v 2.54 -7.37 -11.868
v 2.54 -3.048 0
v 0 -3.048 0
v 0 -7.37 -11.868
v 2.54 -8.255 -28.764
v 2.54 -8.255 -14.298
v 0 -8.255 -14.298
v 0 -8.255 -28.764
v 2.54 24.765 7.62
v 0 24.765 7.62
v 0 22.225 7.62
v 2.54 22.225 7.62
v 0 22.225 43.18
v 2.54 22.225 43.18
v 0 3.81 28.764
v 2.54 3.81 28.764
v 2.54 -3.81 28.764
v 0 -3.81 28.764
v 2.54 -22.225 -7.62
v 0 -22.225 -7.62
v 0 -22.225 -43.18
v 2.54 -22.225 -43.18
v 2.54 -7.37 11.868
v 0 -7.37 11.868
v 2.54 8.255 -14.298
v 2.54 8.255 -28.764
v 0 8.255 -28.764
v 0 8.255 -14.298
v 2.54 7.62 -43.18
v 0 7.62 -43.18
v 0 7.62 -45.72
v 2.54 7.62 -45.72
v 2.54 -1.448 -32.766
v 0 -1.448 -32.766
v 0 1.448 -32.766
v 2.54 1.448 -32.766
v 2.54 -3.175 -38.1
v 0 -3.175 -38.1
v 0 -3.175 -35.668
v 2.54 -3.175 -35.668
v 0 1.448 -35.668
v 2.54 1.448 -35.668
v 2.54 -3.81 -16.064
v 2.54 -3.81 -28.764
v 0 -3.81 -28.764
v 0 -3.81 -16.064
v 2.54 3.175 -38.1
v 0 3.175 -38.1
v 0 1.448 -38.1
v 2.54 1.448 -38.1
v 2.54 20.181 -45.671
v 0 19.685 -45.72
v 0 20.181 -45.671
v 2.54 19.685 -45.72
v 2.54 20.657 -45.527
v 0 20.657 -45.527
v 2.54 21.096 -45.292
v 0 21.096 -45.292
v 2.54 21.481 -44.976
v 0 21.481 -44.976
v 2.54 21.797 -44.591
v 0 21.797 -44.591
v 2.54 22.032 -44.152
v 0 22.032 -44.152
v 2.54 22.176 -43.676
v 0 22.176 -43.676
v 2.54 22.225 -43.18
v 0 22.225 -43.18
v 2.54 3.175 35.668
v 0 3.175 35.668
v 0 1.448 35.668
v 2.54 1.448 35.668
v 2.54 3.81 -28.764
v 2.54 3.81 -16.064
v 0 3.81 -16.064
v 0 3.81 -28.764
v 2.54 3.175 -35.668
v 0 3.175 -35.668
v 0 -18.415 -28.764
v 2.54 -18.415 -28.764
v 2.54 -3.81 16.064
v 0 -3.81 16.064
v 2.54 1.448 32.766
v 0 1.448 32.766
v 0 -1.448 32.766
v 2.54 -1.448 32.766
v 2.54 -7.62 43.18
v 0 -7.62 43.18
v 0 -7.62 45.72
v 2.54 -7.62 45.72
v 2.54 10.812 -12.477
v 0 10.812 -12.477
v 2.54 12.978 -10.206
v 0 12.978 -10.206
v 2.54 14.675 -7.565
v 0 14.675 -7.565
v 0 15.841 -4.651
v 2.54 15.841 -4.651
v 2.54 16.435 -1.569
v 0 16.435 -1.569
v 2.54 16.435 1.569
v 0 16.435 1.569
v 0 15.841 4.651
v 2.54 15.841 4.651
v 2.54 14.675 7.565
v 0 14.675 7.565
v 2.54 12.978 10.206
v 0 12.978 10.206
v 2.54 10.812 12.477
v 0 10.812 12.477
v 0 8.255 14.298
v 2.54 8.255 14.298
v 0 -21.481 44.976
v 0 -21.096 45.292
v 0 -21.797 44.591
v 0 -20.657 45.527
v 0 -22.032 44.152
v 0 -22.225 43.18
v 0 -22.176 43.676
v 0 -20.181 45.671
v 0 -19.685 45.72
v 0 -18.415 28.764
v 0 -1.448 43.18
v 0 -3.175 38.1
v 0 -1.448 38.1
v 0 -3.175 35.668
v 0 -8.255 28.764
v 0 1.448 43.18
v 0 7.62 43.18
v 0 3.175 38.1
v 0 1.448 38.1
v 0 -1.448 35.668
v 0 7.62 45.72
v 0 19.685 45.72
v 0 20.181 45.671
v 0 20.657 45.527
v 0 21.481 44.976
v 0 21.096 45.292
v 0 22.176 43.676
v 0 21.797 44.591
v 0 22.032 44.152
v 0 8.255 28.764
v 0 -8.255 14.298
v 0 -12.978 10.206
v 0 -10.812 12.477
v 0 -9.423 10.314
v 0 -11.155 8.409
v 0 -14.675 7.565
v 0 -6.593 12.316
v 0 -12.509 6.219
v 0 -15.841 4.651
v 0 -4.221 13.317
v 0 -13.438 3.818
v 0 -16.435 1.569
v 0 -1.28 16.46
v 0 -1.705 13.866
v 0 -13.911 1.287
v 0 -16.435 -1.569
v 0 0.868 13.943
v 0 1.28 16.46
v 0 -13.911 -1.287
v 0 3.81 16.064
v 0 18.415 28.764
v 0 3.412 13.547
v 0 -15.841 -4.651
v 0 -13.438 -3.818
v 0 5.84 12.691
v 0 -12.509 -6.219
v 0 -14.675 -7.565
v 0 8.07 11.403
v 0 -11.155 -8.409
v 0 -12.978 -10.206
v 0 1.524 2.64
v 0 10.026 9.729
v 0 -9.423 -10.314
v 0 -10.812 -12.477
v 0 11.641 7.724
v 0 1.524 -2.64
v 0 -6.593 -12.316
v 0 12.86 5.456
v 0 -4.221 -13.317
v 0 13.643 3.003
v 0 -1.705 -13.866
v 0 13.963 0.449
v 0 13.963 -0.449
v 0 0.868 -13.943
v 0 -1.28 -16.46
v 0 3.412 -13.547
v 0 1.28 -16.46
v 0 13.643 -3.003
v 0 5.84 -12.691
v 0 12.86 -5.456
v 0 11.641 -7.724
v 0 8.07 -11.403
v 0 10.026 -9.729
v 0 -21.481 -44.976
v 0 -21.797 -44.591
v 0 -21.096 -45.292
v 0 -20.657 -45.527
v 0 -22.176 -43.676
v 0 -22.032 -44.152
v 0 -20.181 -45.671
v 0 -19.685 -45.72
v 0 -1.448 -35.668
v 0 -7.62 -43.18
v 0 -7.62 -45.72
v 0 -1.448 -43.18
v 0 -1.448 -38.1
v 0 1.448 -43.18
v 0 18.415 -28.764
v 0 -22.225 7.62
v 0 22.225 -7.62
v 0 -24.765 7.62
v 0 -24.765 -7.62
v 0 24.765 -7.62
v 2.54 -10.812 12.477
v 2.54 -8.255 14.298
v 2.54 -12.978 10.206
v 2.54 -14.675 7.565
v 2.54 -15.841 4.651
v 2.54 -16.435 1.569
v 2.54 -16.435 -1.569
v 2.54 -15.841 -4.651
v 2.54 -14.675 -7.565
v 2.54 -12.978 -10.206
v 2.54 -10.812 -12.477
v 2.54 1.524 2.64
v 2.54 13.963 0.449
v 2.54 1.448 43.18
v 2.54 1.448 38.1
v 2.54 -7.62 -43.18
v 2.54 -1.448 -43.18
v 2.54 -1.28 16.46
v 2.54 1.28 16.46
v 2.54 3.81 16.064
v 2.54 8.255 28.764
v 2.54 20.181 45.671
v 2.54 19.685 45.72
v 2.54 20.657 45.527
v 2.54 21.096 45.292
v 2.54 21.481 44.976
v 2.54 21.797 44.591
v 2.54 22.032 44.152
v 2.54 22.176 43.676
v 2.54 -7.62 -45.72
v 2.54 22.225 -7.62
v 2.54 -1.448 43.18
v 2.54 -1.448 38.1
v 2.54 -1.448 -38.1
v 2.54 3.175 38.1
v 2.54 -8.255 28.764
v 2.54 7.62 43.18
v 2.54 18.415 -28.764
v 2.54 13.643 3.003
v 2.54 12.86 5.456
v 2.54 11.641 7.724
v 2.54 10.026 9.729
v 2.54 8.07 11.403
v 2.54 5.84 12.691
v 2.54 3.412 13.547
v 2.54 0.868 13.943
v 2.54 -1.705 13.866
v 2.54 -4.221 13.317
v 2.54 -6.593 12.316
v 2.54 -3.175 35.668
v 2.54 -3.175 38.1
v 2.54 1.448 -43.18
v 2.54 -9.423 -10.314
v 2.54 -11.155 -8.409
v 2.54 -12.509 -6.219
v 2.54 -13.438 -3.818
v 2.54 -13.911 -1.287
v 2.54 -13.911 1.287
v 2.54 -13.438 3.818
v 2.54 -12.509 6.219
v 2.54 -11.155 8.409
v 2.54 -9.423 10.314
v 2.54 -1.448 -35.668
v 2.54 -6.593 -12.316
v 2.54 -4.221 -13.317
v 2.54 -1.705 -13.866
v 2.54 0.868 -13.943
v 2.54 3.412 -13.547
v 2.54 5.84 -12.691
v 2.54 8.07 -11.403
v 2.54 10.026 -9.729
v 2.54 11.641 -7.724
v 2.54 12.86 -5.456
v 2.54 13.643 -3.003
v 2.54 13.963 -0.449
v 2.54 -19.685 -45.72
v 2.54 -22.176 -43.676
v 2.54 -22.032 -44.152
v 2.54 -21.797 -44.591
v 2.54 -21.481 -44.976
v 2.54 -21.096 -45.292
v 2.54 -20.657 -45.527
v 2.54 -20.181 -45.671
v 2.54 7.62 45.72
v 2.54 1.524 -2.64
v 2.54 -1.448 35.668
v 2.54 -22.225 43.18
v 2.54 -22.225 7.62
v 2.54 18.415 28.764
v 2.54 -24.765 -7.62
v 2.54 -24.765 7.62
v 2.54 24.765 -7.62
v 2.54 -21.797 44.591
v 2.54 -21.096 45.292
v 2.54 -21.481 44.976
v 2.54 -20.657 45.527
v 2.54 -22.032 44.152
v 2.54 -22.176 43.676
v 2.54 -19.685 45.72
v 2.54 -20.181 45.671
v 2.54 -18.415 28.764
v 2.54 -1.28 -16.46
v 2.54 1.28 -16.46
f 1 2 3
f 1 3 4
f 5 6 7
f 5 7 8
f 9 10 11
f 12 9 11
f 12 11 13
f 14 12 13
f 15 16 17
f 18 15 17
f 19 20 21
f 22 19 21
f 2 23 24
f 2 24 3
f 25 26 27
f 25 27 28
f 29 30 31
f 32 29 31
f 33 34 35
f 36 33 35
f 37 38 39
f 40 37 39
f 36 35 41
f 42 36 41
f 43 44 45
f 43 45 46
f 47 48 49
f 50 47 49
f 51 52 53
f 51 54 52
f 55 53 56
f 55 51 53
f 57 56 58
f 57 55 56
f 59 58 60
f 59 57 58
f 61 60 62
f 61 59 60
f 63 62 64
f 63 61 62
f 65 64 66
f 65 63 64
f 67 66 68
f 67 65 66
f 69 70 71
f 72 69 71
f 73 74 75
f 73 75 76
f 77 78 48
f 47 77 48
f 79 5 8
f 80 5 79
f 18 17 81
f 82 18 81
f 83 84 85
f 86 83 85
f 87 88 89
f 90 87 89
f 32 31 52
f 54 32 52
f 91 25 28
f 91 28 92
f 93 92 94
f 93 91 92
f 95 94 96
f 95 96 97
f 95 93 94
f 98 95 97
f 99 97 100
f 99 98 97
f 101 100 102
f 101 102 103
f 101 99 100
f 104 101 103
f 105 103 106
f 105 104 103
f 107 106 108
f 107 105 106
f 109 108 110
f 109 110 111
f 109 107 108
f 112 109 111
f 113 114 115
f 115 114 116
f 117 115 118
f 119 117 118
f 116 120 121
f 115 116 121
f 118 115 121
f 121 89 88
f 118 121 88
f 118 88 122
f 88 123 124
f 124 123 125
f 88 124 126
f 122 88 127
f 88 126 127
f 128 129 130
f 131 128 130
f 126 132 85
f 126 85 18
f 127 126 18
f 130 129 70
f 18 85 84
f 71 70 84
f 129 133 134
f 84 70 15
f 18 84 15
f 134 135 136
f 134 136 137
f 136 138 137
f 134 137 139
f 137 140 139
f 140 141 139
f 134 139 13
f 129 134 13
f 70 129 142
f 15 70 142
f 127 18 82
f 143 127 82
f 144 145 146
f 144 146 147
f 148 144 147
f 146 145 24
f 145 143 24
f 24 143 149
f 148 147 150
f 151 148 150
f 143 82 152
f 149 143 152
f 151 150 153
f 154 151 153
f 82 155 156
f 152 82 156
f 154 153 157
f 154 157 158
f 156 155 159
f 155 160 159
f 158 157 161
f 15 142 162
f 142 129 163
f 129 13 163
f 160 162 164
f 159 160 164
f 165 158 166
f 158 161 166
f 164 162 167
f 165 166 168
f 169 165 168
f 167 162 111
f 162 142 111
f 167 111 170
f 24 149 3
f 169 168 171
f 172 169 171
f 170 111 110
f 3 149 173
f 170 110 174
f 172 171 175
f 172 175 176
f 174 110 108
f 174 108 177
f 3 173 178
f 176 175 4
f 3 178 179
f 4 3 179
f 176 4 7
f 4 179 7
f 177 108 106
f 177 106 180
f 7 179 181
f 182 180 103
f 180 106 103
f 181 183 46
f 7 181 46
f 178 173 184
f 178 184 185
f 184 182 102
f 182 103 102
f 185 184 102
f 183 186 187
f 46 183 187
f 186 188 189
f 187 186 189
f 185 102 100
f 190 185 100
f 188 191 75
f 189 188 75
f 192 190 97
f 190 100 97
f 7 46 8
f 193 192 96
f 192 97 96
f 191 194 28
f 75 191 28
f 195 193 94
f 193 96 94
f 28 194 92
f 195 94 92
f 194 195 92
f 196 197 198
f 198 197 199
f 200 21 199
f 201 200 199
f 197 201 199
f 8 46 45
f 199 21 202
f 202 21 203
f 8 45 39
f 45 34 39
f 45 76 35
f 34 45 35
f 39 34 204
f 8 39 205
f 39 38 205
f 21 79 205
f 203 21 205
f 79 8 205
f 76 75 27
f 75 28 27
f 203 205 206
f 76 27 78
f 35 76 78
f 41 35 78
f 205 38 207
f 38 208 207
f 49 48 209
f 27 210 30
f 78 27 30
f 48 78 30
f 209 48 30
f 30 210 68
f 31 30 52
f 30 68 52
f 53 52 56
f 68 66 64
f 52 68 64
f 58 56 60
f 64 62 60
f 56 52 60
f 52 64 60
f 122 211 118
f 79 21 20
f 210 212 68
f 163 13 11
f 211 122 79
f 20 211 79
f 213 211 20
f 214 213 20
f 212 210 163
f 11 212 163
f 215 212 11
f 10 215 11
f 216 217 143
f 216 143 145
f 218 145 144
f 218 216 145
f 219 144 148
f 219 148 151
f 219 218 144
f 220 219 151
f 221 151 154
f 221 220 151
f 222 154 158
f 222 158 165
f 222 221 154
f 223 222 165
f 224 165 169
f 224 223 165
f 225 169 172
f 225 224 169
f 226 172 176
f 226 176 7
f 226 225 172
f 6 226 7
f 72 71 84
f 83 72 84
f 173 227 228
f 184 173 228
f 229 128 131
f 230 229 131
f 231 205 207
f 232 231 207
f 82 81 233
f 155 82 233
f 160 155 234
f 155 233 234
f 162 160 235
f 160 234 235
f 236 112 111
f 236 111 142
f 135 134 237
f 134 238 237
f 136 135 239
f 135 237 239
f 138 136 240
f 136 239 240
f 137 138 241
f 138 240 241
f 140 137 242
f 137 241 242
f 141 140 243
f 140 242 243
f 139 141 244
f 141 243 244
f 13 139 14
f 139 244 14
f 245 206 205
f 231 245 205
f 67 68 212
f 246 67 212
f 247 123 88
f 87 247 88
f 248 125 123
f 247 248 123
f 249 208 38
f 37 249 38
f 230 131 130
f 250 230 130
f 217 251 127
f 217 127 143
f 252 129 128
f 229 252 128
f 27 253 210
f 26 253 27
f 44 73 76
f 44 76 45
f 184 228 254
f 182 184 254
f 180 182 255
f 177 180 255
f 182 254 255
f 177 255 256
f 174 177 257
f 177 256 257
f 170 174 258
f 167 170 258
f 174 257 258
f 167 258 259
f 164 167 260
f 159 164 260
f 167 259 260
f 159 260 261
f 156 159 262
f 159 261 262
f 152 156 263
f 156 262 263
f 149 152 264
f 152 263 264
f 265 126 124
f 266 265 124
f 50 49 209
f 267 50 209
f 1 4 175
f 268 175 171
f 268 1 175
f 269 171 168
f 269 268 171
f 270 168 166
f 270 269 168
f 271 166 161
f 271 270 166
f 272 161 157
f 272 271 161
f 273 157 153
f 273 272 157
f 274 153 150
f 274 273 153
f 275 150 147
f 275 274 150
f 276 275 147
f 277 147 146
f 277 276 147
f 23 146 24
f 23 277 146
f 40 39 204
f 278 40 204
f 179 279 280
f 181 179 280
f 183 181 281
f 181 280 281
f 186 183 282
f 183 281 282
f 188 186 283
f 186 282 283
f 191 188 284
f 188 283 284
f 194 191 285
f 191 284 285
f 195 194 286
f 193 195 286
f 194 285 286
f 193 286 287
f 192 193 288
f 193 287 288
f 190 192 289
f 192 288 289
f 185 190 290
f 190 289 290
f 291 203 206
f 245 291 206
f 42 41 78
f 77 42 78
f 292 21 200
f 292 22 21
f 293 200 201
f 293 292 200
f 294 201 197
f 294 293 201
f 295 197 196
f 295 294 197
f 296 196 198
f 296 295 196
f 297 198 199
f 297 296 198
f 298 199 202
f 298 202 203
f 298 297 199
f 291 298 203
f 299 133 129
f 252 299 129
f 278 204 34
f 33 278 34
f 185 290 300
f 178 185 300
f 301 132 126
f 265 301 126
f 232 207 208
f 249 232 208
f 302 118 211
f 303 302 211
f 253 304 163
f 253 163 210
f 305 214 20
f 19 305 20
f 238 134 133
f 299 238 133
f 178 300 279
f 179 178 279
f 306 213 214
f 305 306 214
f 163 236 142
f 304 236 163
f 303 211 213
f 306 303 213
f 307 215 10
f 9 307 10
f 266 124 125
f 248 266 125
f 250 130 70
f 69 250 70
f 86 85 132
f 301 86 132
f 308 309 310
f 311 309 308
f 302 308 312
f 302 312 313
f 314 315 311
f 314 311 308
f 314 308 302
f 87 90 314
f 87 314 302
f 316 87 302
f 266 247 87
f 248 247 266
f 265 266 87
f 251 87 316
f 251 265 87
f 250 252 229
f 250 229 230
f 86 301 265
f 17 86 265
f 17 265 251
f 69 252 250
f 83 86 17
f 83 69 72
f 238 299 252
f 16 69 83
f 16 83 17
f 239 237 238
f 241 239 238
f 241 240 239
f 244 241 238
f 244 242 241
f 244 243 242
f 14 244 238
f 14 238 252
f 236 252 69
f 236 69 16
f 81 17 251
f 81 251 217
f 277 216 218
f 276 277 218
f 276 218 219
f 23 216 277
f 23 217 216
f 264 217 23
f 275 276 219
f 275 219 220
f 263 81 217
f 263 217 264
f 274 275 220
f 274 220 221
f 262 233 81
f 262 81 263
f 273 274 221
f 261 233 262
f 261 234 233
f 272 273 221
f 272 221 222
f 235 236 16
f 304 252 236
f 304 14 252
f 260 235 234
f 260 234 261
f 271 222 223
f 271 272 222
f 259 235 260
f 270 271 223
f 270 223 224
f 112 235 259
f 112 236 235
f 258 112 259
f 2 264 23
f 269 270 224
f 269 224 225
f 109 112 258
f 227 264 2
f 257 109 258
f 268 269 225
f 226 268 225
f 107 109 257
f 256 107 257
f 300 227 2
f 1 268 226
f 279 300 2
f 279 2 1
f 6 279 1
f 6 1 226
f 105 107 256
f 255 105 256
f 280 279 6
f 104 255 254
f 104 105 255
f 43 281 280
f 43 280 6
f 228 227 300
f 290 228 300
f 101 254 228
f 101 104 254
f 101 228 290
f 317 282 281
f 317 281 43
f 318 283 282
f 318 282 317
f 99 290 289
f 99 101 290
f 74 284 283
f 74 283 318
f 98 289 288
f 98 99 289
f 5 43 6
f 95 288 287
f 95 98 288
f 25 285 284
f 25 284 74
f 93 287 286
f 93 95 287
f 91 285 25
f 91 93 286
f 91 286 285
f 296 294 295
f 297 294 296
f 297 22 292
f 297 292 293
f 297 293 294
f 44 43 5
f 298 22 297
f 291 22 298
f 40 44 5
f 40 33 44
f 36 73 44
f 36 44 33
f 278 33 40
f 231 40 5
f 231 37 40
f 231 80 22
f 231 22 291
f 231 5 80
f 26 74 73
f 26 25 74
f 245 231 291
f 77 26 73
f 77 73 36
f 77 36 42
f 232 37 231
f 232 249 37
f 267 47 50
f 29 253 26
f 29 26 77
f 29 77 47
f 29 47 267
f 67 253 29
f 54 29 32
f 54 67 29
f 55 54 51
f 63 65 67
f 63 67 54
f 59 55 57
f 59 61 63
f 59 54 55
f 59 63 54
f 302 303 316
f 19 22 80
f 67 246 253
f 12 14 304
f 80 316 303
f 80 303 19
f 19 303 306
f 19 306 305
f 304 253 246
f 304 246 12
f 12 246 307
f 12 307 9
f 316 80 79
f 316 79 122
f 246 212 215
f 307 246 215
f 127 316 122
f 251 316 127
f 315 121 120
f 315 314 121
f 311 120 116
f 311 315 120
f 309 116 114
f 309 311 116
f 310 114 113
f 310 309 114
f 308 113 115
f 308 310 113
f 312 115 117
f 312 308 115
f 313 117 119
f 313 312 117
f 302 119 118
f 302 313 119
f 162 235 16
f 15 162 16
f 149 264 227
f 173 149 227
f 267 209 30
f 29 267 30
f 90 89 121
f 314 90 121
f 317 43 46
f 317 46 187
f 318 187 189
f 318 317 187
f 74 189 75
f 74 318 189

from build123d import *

# Parameters (mm, degrees)
BOSS_EXTRUDE1_DEPTH = 2.54
FILLET1_R           = 2.54
CUT_EXTRUDE2_REACH  = 4.54
CUT_EXTRUDE3_DEPTH  = 2.54


with BuildPart() as part:
    # Sketch2 → Boss-Extrude1 (new body)
    with BuildSketch(Plane(origin=(0, 0, 0), x_dir=(0, 0, -1), z_dir=(1, 0, 0))):
        Polygon((-45.72, 22.225), (-45.72, 7.62), (-43.18, 7.62), (-43.18, 1.4478), (-38.1, 1.4478), (-38.1, 3.175), (-35.66795, 3.175), (-35.66795, 1.4478), (-32.766, 1.4478), (-32.766, -1.4478), (-35.66795, -1.4478), (-35.66795, -3.175), (-38.1, -3.175), (-38.1, -1.4478), (-43.18, -1.4478), (-43.18, -7.62), (-45.72, -7.62), (-45.72, -22.225), (-7.62, -22.225), (-7.62, -24.765), (7.62, -24.765), (7.62, -22.225), (45.72, -22.225), (45.72, -7.62), (43.18, -7.62), (43.18, -1.4478), (38.1, -1.4478), (38.1, -3.175), (35.66795, -3.175), (35.66795, -1.4478), (32.766, -1.4478), (32.766, 1.4478), (35.66795, 1.4478), (35.66795, 3.175), (38.1, 3.175), (38.1, 1.4478), (43.18, 1.4478), (43.18, 7.62), (45.72, 7.62), (45.72, 22.225), (7.62, 22.225), (7.62, 24.765), (-7.62, 24.765), (-7.62, 22.225), align=None)
    extrude(amount=BOSS_EXTRUDE1_DEPTH)

    # Fillet1
    fillet1_edges = [part.edges().sort_by_distance(p)[0] for p in [
        (1.27, -22.225, -45.72),
        (1.27, -22.225, 45.72),
        (1.27, 22.225, 45.72),
        (1.27, 22.225, -45.72),
    ]]
    fillet(fillet1_edges, radius=FILLET1_R)

    # Sketch3 → Cut-Extrude2 (cut, up to next)
    with BuildSketch(Plane(origin=(2.54, 0, 0), x_dir=(0, 0, -1), z_dir=(1, 0, 0)), mode=Mode.PRIVATE) as cut_extrude2_sk1:
        with BuildLine():
            Line((2.639645431, 1.524), (12.316467203, -6.592839725))
            ThreePointArc((12.316467203, -6.592839725), (12.098374891, 6.985), (0.448666916, 13.962793345))
            Line((0.448666916, 13.962793345), (2.639645431, 1.524))
        make_face()
    cut_extrude2_tool1 = extrude(cut_extrude2_sk1.sketch, amount=-CUT_EXTRUDE2_REACH, mode=Mode.PRIVATE) & part.part
    add(cut_extrude2_tool1.solids().sort_by_distance((2.54, 4.379888, -7.586189))[0], mode=Mode.SUBTRACT)
    # Sketch3 → Cut-Extrude2 (cut, up to next)
    with BuildSketch(Plane(origin=(2.54, 0, 0), x_dir=(0, 0, -1), z_dir=(1, 0, 0)), mode=Mode.PRIVATE) as cut_extrude2_sk2:
        with BuildLine():
            Line((0, -3.048), (11.867800287, -7.36995362))
            ThreePointArc((11.867800287, -7.36995362), (0, -13.97), (-11.867800287, -7.36995362))
            Line((-11.867800287, -7.36995362), (0, -3.048))
        make_face()
    cut_extrude2_tool2 = extrude(cut_extrude2_sk2.sketch, amount=-CUT_EXTRUDE2_REACH, mode=Mode.PRIVATE) & part.part
    add(cut_extrude2_tool2.solids().sort_by_distance((2.54, -8.759776, 0))[0], mode=Mode.SUBTRACT)
    # Sketch3 → Cut-Extrude2 (cut, up to next)
    with BuildSketch(Plane(origin=(2.54, 0, 0), x_dir=(0, 0, -1), z_dir=(1, 0, 0)), mode=Mode.PRIVATE) as cut_extrude2_sk3:
        with BuildLine():
            Line((-2.639645431, 1.524), (-0.448666916, 13.962793345))
            ThreePointArc((-0.448666916, 13.962793345), (-12.098374891, 6.985), (-12.316467203, -6.592839725))
            Line((-12.316467203, -6.592839725), (-2.639645431, 1.524))
        make_face()
    cut_extrude2_tool3 = extrude(cut_extrude2_sk3.sketch, amount=-CUT_EXTRUDE2_REACH, mode=Mode.PRIVATE) & part.part
    add(cut_extrude2_tool3.solids().sort_by_distance((2.54, 4.379888, 7.586189))[0], mode=Mode.SUBTRACT)

    # Sketch4 → Cut-Extrude3 (cut)
    with BuildSketch(Plane(origin=(2.54, 0, 0), x_dir=(0, 0, -1), z_dir=(1, 0, 0))):
        with BuildLine():
            Line((-28.764370514, 18.415), (28.764370514, 18.415))
            Line((28.764370514, 18.415), (28.764370514, 8.255))
            Line((28.764370514, 8.255), (14.298079416, 8.255))
            ThreePointArc((14.298079416, 8.255), (0, 16.51), (-14.298079416, 8.255))
            Line((-14.298079416, 8.255), (-28.764370514, 8.255))
            Line((-28.764370514, 8.255), (-28.764370514, 18.415))
        make_face()
        with BuildLine():
            Line((-28.764370514, -18.415), (-28.764370514, -8.255))
            Line((-28.764370514, -8.255), (-14.298079416, -8.255))
            ThreePointArc((-14.298079416, -8.255), (0, -16.51), (14.298079416, -8.255))
            Line((14.298079416, -8.255), (28.764370514, -8.255))
            Line((28.764370514, -8.255), (28.764370514, -18.415))
            Line((28.764370514, -18.415), (-28.764370514, -18.415))
        make_face()
        with BuildLine():
            Line((-16.064370514, 3.81), (-28.764370514, 3.81))
            Line((-28.764370514, 3.81), (-28.764370514, -3.81))
            Line((-28.764370514, -3.81), (-16.064370514, -3.81))
            ThreePointArc((-16.064370514, -3.81), (-16.51, 0), (-16.064370514, 3.81))
        make_face()
        with BuildLine():
            Line((28.764370514, -3.81), (16.064370514, -3.81))
            ThreePointArc((16.064370514, -3.81), (16.51, 0), (16.064370514, 3.81))
            Line((16.064370514, 3.81), (28.764370514, 3.81))
            Line((28.764370514, 3.81), (28.764370514, -3.81))
        make_face()
    extrude(amount=-CUT_EXTRUDE3_DEPTH, mode=Mode.SUBTRACT)


solid = part.part
